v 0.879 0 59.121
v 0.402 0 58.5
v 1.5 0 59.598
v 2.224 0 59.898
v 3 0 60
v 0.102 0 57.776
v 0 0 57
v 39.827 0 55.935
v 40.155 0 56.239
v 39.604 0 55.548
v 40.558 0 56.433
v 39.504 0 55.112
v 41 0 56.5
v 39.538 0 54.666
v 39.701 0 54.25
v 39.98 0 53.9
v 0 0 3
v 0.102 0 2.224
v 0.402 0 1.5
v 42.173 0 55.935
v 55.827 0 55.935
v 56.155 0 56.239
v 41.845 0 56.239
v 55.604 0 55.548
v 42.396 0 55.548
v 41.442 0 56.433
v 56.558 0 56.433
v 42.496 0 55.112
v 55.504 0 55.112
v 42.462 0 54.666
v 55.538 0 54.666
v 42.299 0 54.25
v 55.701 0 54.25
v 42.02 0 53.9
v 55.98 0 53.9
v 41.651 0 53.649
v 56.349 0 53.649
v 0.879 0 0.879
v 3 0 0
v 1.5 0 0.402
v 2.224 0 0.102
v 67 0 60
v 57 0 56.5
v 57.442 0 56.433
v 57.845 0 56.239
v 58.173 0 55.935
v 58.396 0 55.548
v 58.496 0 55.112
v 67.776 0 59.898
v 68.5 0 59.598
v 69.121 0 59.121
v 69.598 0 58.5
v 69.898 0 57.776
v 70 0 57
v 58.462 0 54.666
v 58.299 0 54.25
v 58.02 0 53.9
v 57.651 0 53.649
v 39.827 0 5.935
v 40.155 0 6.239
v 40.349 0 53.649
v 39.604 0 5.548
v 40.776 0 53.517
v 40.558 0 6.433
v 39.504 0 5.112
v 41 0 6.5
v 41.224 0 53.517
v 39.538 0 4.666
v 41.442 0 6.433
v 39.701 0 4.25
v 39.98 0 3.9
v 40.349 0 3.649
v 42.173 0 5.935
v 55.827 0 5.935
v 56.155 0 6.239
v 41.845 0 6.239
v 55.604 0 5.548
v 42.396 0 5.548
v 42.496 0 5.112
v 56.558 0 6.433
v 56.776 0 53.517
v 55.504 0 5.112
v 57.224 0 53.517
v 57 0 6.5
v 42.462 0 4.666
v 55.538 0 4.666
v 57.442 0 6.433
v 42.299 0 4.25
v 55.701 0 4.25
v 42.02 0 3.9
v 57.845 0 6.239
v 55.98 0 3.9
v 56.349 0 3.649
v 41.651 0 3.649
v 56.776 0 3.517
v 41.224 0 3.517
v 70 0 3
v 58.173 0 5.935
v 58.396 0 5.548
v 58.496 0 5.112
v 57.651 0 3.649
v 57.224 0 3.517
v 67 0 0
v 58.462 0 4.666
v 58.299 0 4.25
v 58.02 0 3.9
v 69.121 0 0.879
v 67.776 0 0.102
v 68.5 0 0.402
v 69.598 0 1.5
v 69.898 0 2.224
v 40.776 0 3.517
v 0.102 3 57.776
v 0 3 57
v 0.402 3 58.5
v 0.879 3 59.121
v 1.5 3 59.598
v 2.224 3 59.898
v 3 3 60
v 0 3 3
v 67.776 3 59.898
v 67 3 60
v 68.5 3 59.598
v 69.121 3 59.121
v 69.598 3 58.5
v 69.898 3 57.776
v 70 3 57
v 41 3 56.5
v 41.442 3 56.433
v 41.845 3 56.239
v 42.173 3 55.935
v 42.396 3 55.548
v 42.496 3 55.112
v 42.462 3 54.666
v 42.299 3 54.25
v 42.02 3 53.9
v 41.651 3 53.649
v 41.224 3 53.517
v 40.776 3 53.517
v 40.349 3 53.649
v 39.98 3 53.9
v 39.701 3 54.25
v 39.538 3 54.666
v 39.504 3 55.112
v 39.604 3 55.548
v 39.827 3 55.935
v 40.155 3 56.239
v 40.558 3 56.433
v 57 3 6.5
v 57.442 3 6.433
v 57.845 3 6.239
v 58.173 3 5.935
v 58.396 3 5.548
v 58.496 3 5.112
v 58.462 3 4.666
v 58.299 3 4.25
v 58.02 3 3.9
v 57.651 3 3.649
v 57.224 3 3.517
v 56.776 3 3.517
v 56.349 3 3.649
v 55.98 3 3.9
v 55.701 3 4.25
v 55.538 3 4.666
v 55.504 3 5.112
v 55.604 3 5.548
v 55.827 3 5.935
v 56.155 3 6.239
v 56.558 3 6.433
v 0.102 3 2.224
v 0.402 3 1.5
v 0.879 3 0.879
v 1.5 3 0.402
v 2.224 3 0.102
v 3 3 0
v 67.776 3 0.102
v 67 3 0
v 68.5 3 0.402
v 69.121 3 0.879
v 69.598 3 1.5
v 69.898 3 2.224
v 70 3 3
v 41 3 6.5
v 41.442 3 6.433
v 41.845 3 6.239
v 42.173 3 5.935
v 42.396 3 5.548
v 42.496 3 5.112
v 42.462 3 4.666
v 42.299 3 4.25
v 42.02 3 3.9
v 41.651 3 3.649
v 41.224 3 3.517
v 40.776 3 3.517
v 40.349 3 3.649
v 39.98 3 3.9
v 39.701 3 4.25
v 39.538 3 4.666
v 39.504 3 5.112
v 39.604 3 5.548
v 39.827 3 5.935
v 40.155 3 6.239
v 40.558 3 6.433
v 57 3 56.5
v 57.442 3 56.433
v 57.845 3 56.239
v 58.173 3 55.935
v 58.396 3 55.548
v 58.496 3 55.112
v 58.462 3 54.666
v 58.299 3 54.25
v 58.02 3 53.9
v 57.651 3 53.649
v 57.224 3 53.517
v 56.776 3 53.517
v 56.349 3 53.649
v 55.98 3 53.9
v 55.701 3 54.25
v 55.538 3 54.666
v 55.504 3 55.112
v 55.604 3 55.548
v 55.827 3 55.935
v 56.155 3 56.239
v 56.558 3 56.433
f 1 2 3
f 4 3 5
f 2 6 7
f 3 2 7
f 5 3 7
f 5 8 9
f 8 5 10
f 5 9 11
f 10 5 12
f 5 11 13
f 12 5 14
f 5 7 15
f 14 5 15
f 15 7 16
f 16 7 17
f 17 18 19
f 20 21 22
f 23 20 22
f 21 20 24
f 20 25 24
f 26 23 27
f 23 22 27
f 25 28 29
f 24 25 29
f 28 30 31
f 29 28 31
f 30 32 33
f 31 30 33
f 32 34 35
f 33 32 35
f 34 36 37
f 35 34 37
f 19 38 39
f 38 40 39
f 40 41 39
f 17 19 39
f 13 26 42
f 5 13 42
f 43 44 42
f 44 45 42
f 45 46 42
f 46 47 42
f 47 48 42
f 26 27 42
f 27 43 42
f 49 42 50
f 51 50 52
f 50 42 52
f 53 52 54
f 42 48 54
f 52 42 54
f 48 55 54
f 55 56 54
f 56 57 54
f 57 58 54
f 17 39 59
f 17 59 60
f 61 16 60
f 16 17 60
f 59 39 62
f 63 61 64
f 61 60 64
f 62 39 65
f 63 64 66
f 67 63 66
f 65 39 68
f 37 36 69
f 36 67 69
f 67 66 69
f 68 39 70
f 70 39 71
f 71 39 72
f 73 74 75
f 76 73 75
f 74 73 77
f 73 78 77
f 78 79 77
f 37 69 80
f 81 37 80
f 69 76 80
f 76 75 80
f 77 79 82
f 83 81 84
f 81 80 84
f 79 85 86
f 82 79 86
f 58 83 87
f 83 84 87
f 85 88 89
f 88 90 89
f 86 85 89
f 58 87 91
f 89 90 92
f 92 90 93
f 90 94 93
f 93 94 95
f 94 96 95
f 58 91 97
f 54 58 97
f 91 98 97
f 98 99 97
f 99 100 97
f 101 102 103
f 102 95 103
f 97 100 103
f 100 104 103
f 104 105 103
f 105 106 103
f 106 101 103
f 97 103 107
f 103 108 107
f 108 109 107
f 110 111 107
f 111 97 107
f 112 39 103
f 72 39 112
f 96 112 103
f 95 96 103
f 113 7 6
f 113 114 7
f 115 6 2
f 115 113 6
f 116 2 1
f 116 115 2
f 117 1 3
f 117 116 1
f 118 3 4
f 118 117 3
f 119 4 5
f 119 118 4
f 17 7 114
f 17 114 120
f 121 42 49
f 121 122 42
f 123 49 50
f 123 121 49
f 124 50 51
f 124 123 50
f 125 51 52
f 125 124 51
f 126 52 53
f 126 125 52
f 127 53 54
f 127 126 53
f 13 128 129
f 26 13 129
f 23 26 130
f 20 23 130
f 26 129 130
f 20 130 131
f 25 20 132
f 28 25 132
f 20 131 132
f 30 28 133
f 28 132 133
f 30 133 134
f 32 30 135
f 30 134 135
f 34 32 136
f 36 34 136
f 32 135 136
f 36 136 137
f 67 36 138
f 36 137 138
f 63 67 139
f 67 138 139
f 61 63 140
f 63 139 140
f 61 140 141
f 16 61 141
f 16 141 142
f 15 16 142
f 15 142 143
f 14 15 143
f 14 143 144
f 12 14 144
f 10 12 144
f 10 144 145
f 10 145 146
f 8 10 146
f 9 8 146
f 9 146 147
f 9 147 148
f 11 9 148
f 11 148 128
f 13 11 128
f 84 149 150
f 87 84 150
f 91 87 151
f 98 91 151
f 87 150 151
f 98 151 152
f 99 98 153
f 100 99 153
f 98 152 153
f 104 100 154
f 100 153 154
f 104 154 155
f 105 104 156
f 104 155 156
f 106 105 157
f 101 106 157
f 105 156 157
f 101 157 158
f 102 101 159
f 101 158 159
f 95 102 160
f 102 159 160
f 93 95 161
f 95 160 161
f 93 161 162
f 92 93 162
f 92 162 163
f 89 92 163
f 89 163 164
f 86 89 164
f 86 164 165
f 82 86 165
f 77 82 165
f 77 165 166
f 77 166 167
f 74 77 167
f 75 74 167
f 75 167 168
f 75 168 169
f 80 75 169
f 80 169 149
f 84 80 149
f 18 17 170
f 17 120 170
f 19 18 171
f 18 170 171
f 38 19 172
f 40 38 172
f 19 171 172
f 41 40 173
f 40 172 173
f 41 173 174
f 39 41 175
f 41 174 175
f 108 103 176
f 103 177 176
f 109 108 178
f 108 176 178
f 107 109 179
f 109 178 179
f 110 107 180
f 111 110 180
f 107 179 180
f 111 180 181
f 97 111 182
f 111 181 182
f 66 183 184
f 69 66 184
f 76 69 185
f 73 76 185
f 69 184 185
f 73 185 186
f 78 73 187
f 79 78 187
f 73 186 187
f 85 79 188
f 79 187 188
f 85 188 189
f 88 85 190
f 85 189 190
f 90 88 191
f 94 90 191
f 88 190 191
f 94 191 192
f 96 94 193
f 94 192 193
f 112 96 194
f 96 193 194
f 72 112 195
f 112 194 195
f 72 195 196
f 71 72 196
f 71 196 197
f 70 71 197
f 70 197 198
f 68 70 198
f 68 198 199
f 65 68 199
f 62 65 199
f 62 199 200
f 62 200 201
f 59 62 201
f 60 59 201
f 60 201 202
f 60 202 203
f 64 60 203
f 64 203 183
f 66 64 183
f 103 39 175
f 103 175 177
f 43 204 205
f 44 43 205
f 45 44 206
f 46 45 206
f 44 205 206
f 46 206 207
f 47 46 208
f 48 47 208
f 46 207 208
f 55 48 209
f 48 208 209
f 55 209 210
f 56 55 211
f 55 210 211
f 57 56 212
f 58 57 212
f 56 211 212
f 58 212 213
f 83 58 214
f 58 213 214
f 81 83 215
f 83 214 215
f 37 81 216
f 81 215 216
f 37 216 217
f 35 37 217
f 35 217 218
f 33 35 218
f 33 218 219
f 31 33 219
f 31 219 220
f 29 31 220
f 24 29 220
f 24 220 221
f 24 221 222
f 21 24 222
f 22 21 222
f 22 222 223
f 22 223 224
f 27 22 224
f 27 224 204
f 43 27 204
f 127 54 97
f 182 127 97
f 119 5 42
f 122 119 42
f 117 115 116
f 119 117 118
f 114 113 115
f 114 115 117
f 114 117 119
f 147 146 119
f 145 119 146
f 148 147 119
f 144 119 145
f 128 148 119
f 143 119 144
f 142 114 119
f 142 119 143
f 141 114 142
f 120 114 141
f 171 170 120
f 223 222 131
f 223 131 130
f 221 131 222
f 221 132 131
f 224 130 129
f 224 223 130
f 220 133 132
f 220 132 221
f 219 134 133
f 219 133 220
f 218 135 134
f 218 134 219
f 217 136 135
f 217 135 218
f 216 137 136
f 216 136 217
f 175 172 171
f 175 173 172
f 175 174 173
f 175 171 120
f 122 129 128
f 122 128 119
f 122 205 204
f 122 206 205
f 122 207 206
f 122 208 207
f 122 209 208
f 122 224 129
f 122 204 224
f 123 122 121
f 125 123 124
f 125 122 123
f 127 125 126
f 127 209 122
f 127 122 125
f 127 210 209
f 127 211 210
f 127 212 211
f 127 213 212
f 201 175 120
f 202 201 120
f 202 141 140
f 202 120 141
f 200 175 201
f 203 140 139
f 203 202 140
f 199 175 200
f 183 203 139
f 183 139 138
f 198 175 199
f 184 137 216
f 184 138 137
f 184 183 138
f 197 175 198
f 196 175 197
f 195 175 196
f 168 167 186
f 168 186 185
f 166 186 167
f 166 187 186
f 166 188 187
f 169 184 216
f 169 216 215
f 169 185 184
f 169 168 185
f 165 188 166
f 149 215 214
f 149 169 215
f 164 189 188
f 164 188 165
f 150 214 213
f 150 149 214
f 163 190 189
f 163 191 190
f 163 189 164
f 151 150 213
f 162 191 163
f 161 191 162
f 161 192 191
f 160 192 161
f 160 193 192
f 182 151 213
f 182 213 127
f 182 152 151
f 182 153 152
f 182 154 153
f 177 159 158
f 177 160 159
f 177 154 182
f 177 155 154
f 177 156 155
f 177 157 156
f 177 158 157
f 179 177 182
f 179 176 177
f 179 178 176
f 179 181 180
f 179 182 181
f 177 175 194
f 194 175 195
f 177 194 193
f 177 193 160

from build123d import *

# Parameters (mm, degrees)
SKETCH_1_W          = 70
SKETCH_1_H          = 60
EXTRUDE_1_DEPTH     = 3
SKETCH_2_R          = 1.5
CUT_EXTRUDE_1_DEPTH = 93.244241013
FILLET_1_R          = 3


with BuildPart() as part:
    # 草图1 → 凸台-拉伸1 (new body)
    with BuildSketch(Plane(origin=(0, 0, 0), x_dir=(1, 0, 0), z_dir=(0, 1, 0))):
        with Locations((35, -30)):
            Rectangle(SKETCH_1_W, SKETCH_1_H)
    extrude(amount=EXTRUDE_1_DEPTH)

    # 草图2 → 切除-拉伸1 (cut, through all)
    with BuildSketch(Plane(origin=(0, 3, 0), x_dir=(1, 0, 0), z_dir=(0, 1, 0))):
        with Locations(Location((57, -5, 0), (0, 0, 270))):
            Circle(SKETCH_2_R)
        with Locations(Location((41, -5, 0), (0, 0, 270))):
            Circle(SKETCH_2_R)
        with Locations(Location((57, -55, 0), (0, 0, 270))):
            Circle(SKETCH_2_R)
        with Locations(Location((41, -55, 0), (0, 0, 270))):
            Circle(SKETCH_2_R)
    extrude(amount=-CUT_EXTRUDE_1_DEPTH, mode=Mode.SUBTRACT)

    # 圆角1
    fillet_1_edges = [part.edges().sort_by_distance(p)[0] for p in [
        (0, 1.5, 0),
        (70, 1.5, 0),
        (70, 1.5, 60),
        (0, 1.5, 60),
    ]]
    fillet(fillet_1_edges, radius=FILLET_1_R)


solid = part.part
